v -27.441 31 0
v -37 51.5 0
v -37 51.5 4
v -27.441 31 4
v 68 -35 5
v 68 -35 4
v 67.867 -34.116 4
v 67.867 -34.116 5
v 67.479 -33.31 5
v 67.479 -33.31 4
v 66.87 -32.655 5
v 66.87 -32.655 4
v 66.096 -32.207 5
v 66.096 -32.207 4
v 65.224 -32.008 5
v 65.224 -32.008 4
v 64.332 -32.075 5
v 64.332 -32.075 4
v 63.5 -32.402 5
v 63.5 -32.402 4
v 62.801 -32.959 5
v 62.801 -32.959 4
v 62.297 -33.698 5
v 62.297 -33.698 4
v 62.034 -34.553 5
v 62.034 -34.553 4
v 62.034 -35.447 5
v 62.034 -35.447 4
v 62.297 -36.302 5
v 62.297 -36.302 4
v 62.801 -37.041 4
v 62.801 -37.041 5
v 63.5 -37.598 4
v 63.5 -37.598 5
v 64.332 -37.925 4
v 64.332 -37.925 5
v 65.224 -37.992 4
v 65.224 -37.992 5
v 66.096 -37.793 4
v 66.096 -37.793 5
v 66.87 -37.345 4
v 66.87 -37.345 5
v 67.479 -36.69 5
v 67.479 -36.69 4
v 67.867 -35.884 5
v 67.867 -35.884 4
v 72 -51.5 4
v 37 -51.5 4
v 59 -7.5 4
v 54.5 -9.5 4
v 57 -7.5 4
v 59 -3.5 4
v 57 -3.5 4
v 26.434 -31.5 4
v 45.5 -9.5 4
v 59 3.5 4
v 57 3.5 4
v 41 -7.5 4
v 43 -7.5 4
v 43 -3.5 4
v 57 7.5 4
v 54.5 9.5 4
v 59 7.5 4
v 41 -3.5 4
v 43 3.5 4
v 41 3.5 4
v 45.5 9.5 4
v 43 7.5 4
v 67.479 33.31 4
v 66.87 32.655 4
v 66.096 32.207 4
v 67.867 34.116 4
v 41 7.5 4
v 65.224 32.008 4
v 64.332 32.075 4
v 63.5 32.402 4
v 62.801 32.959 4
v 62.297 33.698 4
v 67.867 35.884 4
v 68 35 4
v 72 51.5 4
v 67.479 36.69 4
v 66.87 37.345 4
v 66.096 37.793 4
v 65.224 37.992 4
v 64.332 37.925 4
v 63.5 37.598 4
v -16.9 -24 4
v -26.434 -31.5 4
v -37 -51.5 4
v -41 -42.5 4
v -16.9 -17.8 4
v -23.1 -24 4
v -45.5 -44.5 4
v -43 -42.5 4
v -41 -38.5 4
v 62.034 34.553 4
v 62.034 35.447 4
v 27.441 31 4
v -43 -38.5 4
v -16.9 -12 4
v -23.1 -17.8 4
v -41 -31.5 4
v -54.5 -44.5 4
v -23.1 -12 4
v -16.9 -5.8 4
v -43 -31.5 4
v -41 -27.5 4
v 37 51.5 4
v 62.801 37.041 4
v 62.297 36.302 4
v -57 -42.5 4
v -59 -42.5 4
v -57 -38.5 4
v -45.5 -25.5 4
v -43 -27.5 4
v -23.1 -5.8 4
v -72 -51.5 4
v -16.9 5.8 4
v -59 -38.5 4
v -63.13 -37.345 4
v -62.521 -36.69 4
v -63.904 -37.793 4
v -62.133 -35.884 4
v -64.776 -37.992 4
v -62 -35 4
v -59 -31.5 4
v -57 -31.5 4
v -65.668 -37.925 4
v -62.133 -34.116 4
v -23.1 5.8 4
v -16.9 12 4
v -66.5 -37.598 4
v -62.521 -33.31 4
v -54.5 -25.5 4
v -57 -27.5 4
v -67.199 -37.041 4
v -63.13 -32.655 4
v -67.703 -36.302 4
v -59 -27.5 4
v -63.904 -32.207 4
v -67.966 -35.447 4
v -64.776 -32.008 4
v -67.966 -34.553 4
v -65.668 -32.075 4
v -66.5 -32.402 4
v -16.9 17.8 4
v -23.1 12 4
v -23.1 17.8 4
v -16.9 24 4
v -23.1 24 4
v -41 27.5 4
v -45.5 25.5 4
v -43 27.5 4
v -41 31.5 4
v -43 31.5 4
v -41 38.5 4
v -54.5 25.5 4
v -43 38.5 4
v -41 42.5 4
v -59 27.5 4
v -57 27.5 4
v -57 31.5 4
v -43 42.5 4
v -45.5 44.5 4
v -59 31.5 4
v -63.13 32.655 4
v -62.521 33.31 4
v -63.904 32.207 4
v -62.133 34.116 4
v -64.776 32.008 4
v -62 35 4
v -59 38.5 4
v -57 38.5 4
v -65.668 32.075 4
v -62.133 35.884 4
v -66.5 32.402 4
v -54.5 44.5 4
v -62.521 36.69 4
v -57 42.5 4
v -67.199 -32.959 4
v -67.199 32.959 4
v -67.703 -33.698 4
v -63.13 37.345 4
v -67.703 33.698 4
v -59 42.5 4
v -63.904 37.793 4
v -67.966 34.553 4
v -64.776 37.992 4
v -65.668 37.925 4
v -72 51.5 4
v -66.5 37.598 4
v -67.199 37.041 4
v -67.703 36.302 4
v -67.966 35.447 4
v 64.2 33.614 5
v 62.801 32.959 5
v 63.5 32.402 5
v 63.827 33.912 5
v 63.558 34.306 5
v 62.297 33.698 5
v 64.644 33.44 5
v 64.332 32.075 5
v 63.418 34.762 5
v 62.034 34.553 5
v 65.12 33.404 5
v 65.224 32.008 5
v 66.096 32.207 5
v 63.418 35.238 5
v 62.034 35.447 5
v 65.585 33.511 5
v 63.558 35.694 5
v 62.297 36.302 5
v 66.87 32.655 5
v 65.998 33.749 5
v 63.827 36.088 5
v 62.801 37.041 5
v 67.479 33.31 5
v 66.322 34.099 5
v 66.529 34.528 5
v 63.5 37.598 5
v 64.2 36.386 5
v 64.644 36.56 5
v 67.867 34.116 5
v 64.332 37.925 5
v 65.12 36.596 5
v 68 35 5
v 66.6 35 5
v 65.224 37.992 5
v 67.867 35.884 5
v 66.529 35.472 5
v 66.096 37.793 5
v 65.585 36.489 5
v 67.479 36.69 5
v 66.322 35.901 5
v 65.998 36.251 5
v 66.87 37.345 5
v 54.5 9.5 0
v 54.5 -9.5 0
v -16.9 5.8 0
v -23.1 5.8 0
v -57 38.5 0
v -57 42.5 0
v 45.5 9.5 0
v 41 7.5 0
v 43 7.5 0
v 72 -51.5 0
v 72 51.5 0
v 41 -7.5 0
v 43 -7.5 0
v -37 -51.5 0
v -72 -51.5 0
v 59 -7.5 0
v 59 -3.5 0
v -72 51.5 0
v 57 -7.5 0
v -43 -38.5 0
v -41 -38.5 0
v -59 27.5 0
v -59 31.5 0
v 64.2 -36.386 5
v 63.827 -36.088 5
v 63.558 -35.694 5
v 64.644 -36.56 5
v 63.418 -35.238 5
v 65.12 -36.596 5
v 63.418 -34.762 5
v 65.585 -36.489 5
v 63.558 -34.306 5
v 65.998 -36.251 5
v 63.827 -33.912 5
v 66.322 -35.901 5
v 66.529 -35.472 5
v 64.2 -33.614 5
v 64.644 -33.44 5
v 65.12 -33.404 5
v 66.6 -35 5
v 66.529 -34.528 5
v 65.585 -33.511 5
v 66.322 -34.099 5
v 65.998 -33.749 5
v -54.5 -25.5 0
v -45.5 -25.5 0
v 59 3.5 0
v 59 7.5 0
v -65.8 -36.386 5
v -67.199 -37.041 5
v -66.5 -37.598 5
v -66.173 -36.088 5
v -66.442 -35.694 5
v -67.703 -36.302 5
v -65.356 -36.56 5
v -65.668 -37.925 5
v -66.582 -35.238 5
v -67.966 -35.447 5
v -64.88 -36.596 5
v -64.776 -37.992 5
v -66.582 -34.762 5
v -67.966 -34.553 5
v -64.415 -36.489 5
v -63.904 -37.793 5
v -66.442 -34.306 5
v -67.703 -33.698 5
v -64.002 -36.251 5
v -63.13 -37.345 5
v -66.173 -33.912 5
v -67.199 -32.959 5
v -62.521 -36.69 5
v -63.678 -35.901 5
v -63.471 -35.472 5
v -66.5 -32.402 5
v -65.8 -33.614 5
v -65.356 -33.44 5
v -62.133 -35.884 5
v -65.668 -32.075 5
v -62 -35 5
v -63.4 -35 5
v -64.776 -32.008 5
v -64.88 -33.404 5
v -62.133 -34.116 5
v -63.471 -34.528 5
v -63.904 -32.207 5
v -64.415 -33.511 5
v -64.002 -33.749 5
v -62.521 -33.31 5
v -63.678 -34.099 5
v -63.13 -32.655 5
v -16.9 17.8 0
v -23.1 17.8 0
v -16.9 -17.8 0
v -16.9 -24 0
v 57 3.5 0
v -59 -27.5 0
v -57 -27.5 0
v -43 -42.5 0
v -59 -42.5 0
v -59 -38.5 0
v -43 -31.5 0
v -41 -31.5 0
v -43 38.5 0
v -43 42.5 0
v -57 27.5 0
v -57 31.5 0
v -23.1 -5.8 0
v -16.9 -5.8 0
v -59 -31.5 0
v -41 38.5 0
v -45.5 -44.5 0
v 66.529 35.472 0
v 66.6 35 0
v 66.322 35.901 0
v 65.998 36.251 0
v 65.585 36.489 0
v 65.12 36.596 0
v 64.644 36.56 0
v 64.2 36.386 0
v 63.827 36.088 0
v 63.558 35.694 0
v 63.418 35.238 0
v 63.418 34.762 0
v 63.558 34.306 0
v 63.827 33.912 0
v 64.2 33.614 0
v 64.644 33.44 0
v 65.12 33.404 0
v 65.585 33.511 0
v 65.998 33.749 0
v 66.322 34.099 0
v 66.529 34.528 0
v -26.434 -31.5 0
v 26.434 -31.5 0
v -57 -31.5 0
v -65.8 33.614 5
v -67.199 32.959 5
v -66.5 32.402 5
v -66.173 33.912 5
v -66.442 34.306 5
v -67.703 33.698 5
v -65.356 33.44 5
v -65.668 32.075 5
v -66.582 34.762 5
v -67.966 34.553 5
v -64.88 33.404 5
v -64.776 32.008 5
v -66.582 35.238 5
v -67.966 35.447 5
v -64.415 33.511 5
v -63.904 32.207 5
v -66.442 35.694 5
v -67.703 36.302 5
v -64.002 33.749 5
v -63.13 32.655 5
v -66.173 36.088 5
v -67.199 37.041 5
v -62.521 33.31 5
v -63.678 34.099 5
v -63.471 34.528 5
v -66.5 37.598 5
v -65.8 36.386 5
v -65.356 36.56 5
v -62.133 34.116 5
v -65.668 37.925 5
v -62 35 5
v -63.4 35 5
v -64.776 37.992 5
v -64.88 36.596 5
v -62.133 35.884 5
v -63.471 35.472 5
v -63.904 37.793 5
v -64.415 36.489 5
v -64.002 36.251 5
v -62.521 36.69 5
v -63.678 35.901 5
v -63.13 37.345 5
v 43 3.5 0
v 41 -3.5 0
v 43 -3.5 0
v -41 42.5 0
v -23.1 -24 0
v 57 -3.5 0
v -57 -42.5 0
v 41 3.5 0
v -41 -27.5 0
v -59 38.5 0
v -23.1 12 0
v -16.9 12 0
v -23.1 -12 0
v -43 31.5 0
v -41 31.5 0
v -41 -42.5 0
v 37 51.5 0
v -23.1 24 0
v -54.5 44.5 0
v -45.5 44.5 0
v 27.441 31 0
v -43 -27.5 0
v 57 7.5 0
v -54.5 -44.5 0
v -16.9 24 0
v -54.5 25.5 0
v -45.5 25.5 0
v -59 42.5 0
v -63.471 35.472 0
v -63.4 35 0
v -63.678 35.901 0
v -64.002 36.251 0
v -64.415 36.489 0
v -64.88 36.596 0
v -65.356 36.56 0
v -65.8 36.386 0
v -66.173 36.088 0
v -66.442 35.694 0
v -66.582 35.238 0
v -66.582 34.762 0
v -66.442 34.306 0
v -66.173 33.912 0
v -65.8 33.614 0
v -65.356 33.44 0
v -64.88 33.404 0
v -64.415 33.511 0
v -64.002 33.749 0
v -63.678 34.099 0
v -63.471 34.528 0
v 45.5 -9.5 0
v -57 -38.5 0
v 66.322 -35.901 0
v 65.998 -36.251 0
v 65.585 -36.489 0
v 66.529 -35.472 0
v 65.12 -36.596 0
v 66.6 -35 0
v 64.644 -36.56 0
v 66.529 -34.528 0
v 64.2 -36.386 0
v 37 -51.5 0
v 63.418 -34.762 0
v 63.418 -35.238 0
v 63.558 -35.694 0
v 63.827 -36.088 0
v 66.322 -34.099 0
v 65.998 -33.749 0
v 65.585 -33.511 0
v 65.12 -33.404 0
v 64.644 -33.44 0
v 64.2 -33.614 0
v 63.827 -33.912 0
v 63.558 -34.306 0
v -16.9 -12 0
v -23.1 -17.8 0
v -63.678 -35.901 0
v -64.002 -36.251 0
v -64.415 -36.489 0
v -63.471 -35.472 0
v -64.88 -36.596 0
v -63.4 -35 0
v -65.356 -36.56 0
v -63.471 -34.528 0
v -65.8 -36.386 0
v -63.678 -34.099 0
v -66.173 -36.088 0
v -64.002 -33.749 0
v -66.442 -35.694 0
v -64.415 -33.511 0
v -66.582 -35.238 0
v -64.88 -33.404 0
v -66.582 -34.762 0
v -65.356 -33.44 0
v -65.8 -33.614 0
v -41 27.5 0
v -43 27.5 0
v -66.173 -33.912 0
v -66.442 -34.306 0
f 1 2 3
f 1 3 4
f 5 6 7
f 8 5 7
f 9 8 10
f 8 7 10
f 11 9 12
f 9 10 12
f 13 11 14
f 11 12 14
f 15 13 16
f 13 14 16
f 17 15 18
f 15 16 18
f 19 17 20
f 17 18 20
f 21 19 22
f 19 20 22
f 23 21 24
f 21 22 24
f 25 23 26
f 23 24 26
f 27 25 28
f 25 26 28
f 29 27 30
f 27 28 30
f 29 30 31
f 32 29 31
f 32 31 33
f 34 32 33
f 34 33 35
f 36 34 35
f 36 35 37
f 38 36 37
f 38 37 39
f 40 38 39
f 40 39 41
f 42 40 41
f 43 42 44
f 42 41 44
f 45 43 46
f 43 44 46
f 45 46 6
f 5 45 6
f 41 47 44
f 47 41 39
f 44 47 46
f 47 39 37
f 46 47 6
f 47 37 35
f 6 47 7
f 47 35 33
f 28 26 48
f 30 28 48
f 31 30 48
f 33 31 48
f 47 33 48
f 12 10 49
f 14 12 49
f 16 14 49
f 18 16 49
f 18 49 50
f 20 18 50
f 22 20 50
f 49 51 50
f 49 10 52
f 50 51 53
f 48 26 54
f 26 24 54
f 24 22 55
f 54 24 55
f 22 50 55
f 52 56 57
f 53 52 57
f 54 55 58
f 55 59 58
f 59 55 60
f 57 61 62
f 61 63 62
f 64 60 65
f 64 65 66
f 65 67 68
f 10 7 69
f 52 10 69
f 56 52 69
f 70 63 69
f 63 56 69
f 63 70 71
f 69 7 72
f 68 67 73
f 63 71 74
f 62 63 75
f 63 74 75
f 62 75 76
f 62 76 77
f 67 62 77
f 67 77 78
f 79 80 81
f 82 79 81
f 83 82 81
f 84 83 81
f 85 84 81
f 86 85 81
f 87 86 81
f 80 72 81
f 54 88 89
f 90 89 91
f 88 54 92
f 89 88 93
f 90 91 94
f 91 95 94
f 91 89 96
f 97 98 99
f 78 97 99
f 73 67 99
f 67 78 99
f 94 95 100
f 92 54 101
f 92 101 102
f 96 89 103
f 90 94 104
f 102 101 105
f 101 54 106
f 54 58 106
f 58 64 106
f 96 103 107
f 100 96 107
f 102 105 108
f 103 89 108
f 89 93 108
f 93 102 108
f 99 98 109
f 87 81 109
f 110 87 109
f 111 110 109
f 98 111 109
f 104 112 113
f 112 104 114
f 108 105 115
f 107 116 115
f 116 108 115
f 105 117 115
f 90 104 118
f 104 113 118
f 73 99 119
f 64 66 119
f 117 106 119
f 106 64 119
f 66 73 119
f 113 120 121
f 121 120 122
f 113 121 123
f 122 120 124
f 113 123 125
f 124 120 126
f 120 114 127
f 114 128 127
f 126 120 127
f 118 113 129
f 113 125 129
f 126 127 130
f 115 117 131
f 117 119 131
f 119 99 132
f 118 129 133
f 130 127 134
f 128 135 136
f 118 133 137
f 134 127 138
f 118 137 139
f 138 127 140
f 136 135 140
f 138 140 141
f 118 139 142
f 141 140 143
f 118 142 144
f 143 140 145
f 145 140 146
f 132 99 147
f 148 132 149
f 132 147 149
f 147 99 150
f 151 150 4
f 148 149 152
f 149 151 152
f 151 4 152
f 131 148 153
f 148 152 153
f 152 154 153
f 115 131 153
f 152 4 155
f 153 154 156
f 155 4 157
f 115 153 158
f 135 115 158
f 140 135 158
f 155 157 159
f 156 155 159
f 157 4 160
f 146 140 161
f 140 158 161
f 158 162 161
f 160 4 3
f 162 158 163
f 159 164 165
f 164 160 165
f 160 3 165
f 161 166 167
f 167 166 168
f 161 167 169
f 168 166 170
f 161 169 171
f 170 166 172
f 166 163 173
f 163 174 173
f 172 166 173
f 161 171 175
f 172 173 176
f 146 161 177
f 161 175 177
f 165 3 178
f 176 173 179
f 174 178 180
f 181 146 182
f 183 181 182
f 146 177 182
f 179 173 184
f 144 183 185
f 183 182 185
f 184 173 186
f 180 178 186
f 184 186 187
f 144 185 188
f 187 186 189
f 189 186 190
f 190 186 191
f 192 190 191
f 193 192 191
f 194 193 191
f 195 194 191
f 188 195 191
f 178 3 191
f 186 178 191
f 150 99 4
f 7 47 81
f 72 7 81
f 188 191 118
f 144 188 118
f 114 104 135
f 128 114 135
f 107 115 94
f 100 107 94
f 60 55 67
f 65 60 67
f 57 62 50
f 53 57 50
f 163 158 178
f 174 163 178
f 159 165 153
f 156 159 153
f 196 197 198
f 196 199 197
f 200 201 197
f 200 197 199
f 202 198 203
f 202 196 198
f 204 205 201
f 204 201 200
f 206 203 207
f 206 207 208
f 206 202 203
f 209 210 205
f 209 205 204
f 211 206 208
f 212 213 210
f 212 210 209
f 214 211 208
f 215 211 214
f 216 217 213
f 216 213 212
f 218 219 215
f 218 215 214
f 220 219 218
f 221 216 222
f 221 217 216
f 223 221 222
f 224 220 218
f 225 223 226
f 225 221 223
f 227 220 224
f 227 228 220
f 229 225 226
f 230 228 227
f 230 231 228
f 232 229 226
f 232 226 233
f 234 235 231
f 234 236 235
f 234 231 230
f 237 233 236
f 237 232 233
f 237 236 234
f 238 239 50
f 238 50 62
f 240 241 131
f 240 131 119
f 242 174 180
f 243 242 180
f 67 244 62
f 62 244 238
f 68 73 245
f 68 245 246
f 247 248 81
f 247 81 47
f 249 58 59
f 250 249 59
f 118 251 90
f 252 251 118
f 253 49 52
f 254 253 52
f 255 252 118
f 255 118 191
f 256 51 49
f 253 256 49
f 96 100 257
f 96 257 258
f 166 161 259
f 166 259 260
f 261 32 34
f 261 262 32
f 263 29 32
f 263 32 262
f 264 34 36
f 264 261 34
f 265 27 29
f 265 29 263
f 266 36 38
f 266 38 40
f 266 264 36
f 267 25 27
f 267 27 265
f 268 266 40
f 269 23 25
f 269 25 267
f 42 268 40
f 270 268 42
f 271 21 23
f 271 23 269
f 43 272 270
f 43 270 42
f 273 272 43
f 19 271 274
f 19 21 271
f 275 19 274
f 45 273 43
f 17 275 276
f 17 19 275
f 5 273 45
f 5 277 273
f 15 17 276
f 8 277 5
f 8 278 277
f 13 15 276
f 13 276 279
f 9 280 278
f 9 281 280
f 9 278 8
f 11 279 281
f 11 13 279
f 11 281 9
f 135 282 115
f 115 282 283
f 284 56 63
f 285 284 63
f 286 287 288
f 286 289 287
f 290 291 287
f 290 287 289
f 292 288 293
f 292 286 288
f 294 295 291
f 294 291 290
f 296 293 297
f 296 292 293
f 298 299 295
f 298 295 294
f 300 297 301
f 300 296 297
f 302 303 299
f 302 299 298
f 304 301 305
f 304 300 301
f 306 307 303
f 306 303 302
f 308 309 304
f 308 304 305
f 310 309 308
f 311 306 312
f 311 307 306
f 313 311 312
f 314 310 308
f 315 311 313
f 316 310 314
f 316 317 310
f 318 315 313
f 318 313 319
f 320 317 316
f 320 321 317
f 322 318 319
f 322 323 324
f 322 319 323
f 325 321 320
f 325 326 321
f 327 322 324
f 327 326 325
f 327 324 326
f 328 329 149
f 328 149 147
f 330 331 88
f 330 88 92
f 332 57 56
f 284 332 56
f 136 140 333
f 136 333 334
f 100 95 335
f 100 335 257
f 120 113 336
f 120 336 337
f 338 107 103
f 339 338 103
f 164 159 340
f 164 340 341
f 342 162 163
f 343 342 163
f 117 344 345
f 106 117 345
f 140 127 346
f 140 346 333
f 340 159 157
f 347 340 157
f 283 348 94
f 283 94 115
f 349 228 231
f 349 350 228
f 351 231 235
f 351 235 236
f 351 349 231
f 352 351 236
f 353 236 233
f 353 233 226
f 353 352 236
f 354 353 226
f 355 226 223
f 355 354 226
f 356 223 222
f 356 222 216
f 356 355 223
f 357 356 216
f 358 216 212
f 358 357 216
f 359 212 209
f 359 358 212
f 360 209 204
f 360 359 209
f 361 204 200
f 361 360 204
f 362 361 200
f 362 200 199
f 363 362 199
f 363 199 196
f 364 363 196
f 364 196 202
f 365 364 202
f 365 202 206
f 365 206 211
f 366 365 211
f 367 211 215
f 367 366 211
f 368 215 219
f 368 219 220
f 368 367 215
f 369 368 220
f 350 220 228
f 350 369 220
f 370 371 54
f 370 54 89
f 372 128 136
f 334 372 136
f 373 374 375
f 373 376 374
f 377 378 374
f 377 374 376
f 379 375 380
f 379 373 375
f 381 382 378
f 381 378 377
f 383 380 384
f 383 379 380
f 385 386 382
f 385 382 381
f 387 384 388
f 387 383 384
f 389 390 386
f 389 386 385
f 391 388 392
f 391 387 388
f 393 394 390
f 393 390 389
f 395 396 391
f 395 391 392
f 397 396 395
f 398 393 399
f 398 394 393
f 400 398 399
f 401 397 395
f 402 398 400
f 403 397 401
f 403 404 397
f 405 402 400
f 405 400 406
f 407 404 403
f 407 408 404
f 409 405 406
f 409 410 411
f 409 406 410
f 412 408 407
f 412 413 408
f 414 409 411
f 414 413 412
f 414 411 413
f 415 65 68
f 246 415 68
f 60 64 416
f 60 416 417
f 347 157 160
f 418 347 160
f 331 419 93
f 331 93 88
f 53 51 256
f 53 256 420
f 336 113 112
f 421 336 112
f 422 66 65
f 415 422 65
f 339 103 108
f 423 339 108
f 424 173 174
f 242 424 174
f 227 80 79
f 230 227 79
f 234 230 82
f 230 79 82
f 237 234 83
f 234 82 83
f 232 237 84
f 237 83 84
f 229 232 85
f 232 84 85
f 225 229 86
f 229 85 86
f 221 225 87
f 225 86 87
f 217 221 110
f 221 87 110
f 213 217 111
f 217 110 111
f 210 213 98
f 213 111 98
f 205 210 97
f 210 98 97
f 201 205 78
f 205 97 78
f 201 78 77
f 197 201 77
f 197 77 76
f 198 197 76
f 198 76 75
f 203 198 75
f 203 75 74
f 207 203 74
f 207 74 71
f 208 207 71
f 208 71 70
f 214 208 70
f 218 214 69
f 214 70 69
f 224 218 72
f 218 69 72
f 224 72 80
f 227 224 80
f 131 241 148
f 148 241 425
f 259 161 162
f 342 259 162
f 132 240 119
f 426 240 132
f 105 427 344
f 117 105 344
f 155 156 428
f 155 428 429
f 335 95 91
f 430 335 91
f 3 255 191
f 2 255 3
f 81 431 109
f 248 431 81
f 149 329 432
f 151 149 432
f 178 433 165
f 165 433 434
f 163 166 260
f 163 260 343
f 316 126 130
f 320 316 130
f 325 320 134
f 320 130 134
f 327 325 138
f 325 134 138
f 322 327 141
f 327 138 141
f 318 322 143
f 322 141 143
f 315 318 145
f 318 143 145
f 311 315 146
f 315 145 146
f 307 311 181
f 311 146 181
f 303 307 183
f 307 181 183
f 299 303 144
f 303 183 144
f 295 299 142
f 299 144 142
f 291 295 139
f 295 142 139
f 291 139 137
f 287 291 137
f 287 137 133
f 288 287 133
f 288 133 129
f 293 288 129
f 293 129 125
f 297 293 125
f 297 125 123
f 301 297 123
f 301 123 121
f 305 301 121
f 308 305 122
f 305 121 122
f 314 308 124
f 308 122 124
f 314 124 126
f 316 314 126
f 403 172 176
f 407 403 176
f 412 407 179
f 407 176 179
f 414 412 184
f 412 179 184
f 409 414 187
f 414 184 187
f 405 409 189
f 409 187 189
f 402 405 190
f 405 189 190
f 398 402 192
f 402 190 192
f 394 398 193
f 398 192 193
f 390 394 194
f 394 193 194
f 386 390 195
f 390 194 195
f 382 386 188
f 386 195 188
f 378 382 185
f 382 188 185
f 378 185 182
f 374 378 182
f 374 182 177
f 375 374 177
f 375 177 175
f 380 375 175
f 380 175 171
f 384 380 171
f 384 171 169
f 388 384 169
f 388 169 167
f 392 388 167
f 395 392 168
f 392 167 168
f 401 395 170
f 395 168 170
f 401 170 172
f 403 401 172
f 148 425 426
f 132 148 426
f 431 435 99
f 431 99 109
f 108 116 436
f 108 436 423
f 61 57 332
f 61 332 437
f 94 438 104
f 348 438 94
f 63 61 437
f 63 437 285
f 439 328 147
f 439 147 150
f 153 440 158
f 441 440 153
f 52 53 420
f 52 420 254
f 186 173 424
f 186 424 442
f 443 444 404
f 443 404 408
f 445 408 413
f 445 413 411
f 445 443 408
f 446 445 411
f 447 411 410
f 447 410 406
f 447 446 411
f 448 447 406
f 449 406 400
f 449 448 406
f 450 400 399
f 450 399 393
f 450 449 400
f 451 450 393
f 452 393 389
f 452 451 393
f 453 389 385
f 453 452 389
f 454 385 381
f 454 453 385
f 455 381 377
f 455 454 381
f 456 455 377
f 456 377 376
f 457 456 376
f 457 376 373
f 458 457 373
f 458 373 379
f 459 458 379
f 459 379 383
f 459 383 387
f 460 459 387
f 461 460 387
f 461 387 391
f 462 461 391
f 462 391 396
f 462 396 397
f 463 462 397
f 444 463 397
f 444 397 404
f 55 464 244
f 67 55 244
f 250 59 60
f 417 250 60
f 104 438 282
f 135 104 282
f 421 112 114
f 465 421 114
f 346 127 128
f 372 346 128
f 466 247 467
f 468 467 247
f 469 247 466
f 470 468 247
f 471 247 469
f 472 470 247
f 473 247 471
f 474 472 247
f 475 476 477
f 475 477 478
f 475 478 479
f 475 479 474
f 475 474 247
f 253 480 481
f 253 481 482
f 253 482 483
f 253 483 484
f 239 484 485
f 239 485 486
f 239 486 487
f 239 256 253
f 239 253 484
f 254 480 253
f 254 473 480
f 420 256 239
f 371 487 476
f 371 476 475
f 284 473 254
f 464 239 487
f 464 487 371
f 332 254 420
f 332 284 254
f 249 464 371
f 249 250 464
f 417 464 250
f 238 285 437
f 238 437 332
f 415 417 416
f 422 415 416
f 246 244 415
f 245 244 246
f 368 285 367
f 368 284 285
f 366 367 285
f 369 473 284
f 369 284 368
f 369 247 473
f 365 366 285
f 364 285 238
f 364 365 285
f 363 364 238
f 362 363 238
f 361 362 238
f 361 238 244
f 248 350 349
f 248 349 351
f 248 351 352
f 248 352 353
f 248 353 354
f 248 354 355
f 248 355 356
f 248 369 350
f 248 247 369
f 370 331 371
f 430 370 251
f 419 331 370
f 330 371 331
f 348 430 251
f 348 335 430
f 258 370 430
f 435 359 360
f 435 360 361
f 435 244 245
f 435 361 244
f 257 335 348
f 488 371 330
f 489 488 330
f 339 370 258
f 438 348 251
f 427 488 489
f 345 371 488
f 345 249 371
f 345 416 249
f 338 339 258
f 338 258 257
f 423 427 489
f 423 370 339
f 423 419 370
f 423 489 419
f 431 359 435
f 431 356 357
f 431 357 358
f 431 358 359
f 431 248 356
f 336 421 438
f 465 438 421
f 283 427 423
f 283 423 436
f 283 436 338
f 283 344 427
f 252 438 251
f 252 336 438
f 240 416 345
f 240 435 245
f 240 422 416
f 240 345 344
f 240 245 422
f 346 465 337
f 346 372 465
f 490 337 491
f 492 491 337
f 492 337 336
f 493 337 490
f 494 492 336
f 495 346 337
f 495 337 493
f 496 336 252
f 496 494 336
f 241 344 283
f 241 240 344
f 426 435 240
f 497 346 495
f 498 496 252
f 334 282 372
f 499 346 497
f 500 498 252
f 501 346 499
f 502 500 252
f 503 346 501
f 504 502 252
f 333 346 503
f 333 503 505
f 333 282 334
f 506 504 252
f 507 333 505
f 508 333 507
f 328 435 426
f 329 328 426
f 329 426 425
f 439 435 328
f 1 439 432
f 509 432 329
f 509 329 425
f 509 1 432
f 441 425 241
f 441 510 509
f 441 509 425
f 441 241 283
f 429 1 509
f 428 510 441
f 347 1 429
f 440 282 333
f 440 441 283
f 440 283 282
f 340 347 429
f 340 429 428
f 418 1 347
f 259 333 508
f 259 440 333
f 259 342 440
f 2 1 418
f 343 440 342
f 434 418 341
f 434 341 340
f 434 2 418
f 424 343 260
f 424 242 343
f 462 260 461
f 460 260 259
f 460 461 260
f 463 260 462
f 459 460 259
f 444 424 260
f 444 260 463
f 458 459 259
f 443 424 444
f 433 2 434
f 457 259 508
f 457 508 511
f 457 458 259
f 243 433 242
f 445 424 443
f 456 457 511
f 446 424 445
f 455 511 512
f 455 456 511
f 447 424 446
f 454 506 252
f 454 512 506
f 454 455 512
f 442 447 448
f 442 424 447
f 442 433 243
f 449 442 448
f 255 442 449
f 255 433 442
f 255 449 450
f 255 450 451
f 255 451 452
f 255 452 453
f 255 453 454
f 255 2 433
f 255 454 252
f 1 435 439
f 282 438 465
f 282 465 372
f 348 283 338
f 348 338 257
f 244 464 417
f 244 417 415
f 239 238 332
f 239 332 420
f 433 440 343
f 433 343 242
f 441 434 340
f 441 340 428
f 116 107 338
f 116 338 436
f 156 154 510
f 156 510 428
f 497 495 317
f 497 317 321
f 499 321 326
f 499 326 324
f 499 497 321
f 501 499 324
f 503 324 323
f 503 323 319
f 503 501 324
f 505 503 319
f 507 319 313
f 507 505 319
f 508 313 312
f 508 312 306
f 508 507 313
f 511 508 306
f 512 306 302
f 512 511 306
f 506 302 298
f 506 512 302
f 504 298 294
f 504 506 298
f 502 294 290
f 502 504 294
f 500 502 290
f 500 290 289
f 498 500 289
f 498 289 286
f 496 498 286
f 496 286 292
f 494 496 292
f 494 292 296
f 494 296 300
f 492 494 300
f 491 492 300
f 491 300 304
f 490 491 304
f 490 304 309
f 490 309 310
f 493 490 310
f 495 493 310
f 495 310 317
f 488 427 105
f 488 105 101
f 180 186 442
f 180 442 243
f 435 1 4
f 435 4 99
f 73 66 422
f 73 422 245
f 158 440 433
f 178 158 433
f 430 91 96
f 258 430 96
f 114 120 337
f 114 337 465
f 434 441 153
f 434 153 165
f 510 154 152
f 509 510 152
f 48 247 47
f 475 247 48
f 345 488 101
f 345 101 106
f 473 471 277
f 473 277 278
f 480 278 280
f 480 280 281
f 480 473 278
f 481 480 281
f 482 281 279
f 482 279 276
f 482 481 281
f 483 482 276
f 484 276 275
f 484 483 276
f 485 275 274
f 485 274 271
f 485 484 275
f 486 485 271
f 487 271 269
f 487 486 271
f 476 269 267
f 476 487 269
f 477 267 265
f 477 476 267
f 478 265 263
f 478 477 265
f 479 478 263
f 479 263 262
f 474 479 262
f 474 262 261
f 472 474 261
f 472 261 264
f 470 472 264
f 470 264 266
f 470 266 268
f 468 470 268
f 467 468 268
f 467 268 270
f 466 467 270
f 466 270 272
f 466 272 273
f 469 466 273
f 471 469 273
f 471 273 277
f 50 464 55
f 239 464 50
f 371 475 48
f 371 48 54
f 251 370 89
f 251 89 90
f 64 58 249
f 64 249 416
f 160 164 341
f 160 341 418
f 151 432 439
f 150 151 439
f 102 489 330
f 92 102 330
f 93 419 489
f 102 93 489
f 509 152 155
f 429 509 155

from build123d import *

# Parameters (mm, degrees)
SKETCH_R      = 1.6
SKETCH_W      = 9
SKETCH_H      = 19
SKETCH_W_2    = 6.2
SKETCH_H_2    = 6.2
PAD_DEPTH     = 4
SKETCH001_R   = 3
SKETCH001_R_2 = 1.6
PAD001_DEPTH  = 1
SKETCH002_W   = 2
SKETCH002_H   = 4
POCKET_DEPTH  = 4.001


with BuildPart() as part:
    # Sketch → Pad (new body)
    with BuildSketch(Plane.XY):
        Polygon((-72, 51.5), (-37, 51.5), (-27.440693, 31), (27.440693, 31), (37, 51.5), (72, 51.5), (72, -51.5), (37, -51.5), (26.434474, -31.5), (-26.434474, -31.5), (-37, -51.5), (-72, -51.5), align=None)
        with Locations((65, 35)):
            Circle(SKETCH_R, mode=Mode.SUBTRACT)
        with Locations((65, -35)):
            Circle(SKETCH_R, mode=Mode.SUBTRACT)
        with Locations((-65, 35)):
            Circle(SKETCH_R, mode=Mode.SUBTRACT)
        with Locations((-65, -35)):
            Circle(SKETCH_R, mode=Mode.SUBTRACT)
        with Locations((-50, 35)):
            Rectangle(SKETCH_W, SKETCH_H, mode=Mode.SUBTRACT)
        with Locations((-50, -35)):
            Rectangle(SKETCH_W, SKETCH_H, mode=Mode.SUBTRACT)
        with Locations((50, 0)):
            Rectangle(SKETCH_W, SKETCH_H, mode=Mode.SUBTRACT)
        with Locations((-20, 20.9)):
            Rectangle(SKETCH_W_2, SKETCH_H_2, mode=Mode.SUBTRACT)
        with Locations((-20, 8.9)):
            Rectangle(SKETCH_W_2, SKETCH_H_2, mode=Mode.SUBTRACT)
        with Locations((-20, -20.9)):
            Rectangle(SKETCH_W_2, SKETCH_H_2, mode=Mode.SUBTRACT)
        with Locations((-20, -8.9)):
            Rectangle(SKETCH_W_2, SKETCH_H_2, mode=Mode.SUBTRACT)
    extrude(amount=PAD_DEPTH)

    # Sketch001 → Pad001 (new body)
    with BuildSketch(Plane.XY.offset(4)):
        with Locations((65, 35)):
            Circle(SKETCH001_R)
        with Locations((65, 35)):
            Circle(SKETCH001_R_2, mode=Mode.SUBTRACT)
        with Locations((-65, 35)):
            Circle(SKETCH001_R)
        with Locations((-65, 35)):
            Circle(SKETCH001_R_2, mode=Mode.SUBTRACT)
        with Locations((-65, -35)):
            Circle(SKETCH001_R)
        with Locations((-65, -35)):
            Circle(SKETCH001_R_2, mode=Mode.SUBTRACT)
        with Locations((65, -35)):
            Circle(SKETCH001_R)
        with Locations((65, -35)):
            Circle(SKETCH001_R_2, mode=Mode.SUBTRACT)
    extrude(amount=PAD001_DEPTH)

    # Sketch002 → Pocket (cut, through all)
    with BuildSketch(Plane.XY.offset(4)):
        with Locations((-42, 40.5)):
            Rectangle(SKETCH002_W, SKETCH002_H)
        with Locations((-42, 29.5)):
            Rectangle(SKETCH002_W, SKETCH002_H)
        with Locations((-58, 40.5)):
            Rectangle(SKETCH002_W, SKETCH002_H)
        with Locations((-58, 29.5)):
            Rectangle(SKETCH002_W, SKETCH002_H)
        with Locations((42, 5.5)):
            Rectangle(SKETCH002_W, SKETCH002_H)
        with Locations((58, 5.5)):
            Rectangle(SKETCH002_W, SKETCH002_H)
        with Locations((58, -5.5)):
            Rectangle(SKETCH002_W, SKETCH002_H)
        with Locations((42, -5.5)):
            Rectangle(SKETCH002_W, SKETCH002_H)
        with Locations((-42, -29.5)):
            Rectangle(SKETCH002_W, SKETCH002_H)
        with Locations((-58, -29.5)):
            Rectangle(SKETCH002_W, SKETCH002_H)
        with Locations((-42, -40.5)):
            Rectangle(SKETCH002_W, SKETCH002_H)
        with Locations((-58, -40.5)):
            Rectangle(SKETCH002_W, SKETCH002_H)
    extrude(amount=-POCKET_DEPTH, mode=Mode.SUBTRACT)


solid = part.part
